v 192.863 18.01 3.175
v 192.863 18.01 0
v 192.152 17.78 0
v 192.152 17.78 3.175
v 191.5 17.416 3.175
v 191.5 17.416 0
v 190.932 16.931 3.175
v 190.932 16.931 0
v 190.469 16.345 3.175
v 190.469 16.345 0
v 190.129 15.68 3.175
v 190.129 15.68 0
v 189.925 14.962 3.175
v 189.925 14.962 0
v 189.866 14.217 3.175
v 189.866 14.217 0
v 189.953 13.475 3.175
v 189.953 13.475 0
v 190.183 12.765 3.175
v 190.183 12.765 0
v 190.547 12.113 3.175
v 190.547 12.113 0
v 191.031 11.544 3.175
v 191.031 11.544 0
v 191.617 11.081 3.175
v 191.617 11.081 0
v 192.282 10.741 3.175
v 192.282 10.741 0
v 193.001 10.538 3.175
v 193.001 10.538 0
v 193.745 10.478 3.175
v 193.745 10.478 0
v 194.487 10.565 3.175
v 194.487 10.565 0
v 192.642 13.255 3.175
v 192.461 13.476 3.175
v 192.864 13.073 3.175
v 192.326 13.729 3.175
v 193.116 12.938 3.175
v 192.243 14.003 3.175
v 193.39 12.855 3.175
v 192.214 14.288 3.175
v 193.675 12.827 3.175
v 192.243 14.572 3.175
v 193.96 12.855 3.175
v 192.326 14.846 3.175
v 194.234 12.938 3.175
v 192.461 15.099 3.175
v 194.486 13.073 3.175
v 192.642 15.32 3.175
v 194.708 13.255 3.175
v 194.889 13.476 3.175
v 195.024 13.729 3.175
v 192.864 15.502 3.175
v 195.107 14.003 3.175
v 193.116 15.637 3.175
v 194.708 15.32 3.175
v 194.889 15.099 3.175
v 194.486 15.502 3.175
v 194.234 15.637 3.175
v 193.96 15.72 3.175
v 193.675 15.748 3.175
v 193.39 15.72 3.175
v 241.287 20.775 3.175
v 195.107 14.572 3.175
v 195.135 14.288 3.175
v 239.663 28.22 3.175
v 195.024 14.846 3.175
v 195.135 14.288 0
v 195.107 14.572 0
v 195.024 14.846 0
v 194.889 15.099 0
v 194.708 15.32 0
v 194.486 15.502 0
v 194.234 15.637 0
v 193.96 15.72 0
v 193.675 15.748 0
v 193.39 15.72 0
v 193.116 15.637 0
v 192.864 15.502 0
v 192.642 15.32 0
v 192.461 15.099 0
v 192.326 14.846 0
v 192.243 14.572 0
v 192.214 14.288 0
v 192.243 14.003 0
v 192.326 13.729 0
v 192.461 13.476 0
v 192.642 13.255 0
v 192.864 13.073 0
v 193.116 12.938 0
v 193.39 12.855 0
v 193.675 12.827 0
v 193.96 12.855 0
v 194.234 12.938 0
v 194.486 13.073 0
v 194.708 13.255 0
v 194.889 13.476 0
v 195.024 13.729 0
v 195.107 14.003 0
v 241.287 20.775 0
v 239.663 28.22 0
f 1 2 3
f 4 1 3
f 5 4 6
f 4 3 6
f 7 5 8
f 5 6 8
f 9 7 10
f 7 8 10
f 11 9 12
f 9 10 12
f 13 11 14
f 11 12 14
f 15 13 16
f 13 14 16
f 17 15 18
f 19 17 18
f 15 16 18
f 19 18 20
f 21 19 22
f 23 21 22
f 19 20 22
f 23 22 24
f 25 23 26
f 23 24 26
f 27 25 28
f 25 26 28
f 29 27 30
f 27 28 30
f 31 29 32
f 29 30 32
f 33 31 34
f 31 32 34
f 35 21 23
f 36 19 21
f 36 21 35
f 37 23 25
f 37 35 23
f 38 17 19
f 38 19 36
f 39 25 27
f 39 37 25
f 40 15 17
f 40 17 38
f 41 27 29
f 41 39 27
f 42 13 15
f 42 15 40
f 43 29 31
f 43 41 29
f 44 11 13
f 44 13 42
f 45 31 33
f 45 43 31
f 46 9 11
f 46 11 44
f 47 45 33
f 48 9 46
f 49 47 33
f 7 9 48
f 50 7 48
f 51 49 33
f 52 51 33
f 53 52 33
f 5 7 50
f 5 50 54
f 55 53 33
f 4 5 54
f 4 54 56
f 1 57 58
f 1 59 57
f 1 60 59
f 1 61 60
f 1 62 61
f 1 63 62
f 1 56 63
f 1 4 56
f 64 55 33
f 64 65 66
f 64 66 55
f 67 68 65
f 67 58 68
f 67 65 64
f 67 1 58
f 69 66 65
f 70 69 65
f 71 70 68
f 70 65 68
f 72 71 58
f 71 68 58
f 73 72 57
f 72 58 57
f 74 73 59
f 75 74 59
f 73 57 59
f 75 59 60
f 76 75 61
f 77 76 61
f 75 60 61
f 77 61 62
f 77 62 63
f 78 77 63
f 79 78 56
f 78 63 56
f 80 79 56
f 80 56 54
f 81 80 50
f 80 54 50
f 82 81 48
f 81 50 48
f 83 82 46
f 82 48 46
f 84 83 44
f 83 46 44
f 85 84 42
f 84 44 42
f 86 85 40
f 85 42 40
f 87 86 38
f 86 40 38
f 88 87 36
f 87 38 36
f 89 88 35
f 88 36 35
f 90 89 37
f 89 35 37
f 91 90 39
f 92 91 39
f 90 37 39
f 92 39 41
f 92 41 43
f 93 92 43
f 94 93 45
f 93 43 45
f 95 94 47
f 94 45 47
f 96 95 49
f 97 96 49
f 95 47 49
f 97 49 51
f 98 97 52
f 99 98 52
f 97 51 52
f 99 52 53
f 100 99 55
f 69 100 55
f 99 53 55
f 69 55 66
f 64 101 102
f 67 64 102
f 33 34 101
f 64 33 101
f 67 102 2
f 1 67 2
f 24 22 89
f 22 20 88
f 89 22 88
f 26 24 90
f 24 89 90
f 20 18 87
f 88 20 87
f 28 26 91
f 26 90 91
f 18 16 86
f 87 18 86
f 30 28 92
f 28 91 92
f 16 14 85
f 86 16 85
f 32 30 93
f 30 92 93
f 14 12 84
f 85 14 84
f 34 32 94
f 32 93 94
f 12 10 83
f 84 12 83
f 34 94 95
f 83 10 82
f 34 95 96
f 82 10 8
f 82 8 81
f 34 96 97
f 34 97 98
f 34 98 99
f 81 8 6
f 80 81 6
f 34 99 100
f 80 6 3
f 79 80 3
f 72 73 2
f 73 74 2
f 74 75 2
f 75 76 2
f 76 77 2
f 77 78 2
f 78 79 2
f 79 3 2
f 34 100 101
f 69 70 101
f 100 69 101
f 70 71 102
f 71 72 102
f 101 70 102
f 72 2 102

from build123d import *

# Parameters (mm, degrees)
SKETCH2_R           = 3.81
BOSS_EXTRUDE1_DEPTH = 3.175
SKETCH3_R           = 1.4605
CUT_EXTRUDE1_DEPTH  = 3.175


with BuildPart() as part:
    # Sketch2 → Boss-Extrude1 (new body)
    with BuildSketch(Plane.XY):
        with Locations((193.674999999, 14.287500001)):
            Circle(SKETCH2_R)
        Polygon((192.86290311, 18.009945251), (194.487096888, 10.56505475), (241.287043978, 20.775034718), (239.6628502, 28.219925218), align=None)
    extrude(amount=BOSS_EXTRUDE1_DEPTH)

    # Sketch3 → Cut-Extrude1 (cut)
    with BuildSketch(Plane.XY.offset(3.175)):
        with Locations((193.674999999, 14.287500001)):
            Circle(SKETCH3_R)
    extrude(amount=-CUT_EXTRUDE1_DEPTH, mode=Mode.SUBTRACT)


solid = part.part
